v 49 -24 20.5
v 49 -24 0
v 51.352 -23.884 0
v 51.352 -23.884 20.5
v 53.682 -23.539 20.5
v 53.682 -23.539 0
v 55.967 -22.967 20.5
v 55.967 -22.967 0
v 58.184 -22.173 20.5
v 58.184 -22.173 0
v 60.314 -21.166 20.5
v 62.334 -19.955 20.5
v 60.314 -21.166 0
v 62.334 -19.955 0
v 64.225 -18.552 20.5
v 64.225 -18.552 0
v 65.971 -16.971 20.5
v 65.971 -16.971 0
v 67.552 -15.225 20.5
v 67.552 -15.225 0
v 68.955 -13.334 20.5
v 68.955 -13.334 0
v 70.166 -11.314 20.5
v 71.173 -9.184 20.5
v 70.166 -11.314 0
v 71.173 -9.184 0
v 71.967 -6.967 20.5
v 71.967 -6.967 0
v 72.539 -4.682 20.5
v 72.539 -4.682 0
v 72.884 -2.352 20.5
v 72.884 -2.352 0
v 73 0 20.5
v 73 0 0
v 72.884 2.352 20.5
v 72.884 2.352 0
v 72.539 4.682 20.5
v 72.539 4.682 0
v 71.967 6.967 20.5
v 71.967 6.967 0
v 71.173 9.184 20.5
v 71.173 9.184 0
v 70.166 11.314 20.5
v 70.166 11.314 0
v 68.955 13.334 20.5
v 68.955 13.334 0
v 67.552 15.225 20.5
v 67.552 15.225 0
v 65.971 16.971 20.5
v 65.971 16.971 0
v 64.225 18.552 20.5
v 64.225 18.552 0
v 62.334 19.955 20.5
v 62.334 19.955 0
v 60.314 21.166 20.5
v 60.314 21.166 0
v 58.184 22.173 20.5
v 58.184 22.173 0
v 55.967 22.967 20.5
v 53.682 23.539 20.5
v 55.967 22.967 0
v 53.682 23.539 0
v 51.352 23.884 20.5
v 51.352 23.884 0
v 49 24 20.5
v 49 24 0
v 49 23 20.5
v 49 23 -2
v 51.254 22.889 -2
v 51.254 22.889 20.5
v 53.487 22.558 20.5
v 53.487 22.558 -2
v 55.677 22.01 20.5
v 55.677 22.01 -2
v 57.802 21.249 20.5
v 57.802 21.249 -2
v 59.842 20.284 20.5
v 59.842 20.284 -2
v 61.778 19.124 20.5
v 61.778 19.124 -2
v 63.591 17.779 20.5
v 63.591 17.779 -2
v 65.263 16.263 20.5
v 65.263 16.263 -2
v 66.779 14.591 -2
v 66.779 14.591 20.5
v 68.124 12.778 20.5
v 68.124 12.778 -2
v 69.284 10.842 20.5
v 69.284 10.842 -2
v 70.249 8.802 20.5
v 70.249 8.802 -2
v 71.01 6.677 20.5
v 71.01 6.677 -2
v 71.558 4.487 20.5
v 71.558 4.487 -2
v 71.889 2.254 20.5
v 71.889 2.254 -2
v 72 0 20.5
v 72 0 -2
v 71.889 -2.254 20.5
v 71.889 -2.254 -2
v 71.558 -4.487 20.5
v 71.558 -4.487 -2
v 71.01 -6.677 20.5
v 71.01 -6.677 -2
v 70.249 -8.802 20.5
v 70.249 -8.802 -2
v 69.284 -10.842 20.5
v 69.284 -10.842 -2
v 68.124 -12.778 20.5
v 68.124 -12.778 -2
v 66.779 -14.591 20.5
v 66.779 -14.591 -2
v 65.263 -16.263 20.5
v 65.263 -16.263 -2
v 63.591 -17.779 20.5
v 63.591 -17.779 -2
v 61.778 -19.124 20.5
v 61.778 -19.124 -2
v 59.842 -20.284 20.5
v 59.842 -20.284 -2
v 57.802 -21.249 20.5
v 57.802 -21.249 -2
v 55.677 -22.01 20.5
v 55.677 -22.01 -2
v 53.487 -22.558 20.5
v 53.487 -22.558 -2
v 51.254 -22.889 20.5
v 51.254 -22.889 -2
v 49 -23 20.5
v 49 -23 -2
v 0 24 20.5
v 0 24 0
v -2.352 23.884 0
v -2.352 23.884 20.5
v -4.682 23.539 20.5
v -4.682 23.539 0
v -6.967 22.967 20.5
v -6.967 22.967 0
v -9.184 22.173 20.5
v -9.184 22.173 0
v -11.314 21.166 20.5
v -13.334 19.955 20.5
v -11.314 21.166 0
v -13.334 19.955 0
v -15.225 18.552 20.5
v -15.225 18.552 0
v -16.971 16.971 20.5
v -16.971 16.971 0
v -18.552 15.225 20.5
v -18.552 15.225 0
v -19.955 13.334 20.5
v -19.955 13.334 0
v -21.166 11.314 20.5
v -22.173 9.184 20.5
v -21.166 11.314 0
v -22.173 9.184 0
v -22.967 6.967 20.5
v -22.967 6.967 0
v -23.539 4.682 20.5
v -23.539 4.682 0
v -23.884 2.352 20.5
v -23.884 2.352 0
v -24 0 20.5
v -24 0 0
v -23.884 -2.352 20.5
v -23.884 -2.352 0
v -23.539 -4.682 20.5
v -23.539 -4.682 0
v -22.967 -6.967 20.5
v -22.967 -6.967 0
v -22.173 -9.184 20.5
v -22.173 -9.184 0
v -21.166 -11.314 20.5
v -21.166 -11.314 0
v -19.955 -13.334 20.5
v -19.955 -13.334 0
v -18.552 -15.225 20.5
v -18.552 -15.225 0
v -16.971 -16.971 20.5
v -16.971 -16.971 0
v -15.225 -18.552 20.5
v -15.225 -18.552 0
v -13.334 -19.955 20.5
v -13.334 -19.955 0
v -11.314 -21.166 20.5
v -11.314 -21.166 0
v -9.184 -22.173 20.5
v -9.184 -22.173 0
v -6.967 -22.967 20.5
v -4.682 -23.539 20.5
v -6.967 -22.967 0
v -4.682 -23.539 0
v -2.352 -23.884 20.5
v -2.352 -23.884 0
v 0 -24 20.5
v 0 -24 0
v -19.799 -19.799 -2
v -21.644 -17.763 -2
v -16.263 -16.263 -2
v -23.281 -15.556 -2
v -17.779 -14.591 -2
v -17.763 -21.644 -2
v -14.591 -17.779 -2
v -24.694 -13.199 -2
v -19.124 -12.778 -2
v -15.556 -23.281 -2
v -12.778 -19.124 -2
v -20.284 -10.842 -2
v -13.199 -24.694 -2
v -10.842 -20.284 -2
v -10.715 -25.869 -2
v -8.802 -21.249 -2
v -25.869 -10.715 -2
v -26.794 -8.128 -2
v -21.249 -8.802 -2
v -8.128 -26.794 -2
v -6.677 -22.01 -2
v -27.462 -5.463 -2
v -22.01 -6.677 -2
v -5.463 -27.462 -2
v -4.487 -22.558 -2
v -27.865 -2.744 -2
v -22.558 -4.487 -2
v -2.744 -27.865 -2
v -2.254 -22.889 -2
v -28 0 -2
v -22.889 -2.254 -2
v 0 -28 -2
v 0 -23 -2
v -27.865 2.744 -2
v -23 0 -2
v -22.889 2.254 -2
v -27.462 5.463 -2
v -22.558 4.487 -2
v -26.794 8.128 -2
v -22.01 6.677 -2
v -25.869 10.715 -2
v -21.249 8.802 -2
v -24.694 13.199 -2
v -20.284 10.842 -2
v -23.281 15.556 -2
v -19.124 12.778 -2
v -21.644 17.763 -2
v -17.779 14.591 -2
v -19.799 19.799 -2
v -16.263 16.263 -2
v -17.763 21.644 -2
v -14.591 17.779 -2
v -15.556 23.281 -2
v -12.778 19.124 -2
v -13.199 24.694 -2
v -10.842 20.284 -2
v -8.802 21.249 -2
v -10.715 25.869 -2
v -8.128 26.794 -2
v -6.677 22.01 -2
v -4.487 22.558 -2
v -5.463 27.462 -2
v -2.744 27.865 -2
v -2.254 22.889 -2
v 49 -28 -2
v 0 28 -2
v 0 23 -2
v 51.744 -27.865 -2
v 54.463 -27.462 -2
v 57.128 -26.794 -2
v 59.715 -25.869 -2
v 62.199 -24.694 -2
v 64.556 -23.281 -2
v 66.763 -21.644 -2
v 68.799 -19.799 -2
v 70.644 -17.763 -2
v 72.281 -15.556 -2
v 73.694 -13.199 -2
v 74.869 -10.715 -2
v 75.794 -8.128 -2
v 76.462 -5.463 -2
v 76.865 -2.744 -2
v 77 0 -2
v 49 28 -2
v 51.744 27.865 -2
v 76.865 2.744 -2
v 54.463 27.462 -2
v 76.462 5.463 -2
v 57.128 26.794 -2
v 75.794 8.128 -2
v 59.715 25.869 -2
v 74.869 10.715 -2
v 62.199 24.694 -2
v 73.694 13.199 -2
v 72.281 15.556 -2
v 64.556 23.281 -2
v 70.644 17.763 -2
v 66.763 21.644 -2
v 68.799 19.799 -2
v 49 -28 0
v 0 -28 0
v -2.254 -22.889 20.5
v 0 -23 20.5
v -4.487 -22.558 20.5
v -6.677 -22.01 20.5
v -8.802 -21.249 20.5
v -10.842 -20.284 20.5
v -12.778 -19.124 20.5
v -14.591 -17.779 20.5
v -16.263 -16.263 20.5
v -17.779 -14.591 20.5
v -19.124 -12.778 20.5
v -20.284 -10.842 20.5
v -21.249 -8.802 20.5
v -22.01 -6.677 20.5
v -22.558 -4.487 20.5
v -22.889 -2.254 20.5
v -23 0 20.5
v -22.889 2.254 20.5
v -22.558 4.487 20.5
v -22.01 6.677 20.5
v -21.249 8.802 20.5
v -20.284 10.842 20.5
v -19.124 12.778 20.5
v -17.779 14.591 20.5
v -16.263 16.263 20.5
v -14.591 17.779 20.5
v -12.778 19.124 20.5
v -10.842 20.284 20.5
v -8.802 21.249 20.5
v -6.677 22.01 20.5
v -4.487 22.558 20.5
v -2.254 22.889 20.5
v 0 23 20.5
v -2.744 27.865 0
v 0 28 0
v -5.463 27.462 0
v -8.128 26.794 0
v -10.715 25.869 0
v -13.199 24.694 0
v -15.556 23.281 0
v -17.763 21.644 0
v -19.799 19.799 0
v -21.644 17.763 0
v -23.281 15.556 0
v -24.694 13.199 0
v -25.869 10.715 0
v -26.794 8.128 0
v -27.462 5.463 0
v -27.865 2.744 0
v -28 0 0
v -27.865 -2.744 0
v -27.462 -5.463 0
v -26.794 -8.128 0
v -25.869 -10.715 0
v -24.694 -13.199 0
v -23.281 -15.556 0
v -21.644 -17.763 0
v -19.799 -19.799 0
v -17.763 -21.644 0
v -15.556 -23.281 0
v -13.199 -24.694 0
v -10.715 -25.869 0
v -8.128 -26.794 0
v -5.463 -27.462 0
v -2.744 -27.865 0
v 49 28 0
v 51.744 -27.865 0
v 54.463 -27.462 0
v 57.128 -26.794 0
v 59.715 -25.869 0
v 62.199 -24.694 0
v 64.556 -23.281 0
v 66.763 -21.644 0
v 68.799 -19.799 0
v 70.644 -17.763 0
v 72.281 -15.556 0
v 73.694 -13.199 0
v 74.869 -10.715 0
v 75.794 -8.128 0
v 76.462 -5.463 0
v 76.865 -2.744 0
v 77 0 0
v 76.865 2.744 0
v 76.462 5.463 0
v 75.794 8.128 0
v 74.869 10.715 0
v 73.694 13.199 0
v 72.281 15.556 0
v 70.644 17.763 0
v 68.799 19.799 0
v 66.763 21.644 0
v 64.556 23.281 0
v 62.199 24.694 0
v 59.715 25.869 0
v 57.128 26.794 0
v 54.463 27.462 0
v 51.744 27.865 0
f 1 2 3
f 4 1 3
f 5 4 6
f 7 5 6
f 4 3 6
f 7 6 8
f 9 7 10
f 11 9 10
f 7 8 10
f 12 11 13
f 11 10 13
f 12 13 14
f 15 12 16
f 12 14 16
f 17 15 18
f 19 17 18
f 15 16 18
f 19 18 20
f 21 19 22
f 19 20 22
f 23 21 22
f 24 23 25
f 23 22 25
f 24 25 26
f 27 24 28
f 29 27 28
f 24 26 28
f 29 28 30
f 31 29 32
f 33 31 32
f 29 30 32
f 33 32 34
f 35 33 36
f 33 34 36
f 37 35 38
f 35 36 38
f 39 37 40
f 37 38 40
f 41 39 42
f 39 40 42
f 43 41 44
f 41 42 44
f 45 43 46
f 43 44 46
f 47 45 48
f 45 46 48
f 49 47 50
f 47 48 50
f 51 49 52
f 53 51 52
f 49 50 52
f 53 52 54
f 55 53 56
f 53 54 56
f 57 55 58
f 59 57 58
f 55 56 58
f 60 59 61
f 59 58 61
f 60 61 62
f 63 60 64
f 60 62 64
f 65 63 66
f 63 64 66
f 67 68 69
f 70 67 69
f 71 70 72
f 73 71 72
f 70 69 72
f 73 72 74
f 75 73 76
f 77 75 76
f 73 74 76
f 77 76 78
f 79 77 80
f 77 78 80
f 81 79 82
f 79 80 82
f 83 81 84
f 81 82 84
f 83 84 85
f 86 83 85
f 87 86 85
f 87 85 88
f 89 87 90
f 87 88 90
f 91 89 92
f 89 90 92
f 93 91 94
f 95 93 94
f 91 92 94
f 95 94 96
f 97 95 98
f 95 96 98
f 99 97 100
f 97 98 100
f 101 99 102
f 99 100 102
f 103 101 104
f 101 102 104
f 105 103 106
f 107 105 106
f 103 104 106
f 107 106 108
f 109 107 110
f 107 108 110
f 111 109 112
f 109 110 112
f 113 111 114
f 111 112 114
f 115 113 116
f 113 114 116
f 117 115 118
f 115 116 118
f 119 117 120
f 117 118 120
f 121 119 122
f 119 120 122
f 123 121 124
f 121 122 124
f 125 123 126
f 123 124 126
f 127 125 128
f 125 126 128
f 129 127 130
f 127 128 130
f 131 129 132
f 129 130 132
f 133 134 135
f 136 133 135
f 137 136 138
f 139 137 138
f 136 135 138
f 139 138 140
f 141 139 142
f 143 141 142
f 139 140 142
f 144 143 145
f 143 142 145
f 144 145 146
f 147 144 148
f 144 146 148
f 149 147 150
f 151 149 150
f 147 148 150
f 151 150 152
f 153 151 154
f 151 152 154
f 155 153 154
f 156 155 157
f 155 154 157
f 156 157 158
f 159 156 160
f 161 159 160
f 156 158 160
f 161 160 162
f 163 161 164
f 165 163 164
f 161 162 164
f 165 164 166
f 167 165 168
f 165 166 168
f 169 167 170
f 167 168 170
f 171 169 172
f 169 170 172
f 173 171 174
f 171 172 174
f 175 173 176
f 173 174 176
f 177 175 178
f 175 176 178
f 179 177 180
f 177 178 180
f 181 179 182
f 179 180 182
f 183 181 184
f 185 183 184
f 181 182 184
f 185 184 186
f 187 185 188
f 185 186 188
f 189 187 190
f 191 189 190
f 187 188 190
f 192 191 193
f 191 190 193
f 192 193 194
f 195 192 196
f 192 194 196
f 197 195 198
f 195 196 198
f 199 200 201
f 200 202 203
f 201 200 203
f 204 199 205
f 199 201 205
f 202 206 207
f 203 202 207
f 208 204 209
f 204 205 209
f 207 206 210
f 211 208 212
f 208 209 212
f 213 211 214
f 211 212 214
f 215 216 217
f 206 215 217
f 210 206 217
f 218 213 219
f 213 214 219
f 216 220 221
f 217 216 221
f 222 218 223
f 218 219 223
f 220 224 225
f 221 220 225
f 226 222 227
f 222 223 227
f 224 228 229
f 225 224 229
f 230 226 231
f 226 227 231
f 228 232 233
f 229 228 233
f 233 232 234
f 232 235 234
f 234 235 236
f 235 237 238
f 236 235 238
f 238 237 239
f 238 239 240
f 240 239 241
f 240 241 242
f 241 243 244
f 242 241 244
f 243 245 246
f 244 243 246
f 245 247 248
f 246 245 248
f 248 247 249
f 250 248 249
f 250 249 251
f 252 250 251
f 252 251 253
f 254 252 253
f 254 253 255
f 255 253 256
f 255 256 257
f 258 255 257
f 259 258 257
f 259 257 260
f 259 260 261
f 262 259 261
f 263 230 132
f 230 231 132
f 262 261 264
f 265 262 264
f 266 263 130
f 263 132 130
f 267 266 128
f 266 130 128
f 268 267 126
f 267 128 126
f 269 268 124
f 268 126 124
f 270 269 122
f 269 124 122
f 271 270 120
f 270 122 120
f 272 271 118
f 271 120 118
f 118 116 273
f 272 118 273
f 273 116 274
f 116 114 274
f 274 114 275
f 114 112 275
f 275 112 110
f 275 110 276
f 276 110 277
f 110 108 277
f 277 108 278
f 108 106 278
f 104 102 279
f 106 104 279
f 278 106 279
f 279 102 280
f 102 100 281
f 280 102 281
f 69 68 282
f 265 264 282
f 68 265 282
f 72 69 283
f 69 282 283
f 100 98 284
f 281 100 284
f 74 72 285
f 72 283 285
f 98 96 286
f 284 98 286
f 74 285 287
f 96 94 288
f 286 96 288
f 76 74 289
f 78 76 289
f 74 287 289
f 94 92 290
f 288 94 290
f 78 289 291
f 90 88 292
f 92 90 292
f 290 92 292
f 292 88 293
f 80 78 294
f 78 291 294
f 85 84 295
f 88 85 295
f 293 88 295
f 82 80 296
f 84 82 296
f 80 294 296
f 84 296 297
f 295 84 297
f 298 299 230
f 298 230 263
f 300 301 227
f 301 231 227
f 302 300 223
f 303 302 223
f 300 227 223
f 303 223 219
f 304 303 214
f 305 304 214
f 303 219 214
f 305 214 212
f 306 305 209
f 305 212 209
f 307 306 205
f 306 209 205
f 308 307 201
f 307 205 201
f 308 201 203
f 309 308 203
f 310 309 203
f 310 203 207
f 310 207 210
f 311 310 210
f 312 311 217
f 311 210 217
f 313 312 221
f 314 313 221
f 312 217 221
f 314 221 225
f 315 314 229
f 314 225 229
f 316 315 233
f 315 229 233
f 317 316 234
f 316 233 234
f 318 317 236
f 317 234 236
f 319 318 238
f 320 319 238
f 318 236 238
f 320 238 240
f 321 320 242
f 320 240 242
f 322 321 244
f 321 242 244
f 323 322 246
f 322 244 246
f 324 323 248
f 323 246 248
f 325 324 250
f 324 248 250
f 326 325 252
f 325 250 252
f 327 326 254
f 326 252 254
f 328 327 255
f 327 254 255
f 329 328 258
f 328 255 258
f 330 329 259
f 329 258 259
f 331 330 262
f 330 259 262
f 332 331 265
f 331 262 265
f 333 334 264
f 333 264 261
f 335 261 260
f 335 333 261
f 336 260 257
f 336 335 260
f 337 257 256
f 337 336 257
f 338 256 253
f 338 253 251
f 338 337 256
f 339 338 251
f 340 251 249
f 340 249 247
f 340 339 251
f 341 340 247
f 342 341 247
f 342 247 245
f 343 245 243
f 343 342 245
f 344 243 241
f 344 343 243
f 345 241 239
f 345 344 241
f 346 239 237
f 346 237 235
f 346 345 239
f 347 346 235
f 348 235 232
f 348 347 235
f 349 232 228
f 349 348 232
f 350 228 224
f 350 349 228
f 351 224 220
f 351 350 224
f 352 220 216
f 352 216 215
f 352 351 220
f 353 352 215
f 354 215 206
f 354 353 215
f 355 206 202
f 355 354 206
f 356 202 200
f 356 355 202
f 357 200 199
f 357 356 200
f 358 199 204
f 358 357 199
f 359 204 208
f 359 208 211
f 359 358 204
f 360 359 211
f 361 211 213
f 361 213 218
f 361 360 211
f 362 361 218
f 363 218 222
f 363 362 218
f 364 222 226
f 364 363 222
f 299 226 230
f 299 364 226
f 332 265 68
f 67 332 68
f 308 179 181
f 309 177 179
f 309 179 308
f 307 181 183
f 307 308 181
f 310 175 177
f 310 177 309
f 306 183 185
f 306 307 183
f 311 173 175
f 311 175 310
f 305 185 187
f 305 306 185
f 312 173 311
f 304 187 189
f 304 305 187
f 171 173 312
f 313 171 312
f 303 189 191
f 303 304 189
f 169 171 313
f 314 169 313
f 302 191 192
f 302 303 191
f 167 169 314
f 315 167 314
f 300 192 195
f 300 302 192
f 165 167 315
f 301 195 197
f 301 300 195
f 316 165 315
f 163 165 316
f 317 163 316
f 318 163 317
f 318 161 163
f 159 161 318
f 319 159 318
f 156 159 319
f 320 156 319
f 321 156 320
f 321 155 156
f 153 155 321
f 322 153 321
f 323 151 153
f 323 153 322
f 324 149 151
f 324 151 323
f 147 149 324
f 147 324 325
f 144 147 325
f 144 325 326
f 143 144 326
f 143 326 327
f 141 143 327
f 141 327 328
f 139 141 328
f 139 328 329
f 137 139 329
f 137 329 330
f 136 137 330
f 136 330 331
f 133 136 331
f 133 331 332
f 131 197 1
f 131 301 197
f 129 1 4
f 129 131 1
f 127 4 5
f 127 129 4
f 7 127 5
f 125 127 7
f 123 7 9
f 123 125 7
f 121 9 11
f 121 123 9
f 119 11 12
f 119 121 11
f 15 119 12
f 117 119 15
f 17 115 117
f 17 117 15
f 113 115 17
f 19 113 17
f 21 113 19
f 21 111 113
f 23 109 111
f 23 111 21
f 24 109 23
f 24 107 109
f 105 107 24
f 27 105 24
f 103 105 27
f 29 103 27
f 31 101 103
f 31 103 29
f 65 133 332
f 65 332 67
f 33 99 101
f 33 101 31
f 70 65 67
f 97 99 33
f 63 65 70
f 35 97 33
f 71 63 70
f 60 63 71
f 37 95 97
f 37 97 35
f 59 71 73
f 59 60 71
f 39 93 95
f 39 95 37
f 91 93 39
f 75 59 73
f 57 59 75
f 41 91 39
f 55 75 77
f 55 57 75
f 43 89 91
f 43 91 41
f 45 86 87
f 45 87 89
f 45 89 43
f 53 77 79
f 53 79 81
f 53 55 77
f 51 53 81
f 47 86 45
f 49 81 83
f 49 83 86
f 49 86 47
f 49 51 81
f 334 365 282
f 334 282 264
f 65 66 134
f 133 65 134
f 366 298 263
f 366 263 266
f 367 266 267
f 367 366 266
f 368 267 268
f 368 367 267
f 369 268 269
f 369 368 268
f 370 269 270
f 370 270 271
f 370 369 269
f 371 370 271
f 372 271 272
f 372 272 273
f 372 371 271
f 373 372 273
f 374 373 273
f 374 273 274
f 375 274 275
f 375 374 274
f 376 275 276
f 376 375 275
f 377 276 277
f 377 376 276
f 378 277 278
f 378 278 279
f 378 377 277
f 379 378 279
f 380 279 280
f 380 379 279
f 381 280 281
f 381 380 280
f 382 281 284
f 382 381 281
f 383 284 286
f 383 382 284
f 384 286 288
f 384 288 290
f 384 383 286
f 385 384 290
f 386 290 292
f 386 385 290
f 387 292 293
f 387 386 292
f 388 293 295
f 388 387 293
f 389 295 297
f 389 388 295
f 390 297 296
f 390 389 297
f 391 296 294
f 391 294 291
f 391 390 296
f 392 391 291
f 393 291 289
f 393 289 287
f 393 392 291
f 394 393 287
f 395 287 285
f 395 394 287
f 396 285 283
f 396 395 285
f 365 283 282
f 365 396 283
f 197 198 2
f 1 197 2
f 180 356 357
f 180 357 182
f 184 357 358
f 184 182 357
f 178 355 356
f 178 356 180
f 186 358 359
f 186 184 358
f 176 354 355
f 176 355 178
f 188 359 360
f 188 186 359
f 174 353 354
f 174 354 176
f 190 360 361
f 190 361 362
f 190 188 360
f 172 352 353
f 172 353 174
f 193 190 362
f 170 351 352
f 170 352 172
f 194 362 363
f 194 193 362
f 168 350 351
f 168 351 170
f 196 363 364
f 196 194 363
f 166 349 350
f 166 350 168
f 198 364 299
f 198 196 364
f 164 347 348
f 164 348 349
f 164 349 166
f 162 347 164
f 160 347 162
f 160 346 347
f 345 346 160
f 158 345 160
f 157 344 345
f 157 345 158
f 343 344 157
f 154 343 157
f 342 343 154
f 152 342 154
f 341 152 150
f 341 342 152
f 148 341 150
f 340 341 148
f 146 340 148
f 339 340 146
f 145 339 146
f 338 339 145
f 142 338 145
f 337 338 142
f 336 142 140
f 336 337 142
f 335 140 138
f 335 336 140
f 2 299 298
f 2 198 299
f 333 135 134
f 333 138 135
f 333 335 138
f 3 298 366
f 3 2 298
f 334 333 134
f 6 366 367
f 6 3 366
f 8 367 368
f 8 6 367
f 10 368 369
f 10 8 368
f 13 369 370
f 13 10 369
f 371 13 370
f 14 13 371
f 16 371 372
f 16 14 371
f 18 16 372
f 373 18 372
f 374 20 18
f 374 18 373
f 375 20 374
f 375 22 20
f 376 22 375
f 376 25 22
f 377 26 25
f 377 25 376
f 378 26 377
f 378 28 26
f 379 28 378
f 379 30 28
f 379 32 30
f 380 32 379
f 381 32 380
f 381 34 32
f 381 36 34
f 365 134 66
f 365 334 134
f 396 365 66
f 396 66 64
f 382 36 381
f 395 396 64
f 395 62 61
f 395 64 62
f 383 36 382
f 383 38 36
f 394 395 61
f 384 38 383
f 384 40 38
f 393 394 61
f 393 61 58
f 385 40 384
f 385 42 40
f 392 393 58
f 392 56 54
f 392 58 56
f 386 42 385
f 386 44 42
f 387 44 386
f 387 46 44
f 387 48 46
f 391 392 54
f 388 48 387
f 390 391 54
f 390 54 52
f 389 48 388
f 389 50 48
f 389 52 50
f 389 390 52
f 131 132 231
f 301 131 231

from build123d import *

# Parameters (mm, degrees)
F1_DEPTH = 2
F2_DEPTH = 20.5


with BuildPart() as f1:
    # F0 (on Top) → F1 (new body)
    with BuildSketch(Plane.XY):
        with BuildLine():
            Line((49, 28), (0, 28))
            ThreePointArc((0, 28), (-28, 0), (0, -28))
            Line((0, -28), (49, -28))
            ThreePointArc((49, -28), (77, 0), (49, 28))
        make_face()
        with BuildLine():
            ThreePointArc((0, -24), (-24, 0), (0, 24))
            Line((0, 24), (49, 24))
            ThreePointArc((49, 24), (73, 0), (49, -24))
            Line((49, -24), (0, -24))
        make_face(mode=Mode.SUBTRACT)
        with BuildLine():
            Line((49, 24), (0, 24))
            ThreePointArc((0, 24), (-24, 0), (0, -24))
            Line((0, -24), (49, -24))
            ThreePointArc((49, -24), (73, 0), (49, 24))
        make_face()
        with BuildLine():
            ThreePointArc((0, -23), (-23, 0), (0, 23))
            Line((0, 23), (49, 23))
            ThreePointArc((49, 23), (72, 0), (49, -23))
            Line((49, -23), (0, -23))
        make_face(mode=Mode.SUBTRACT)
    extrude(amount=-F1_DEPTH)

    # F0 (on Top) → F2 (join)
    with BuildSketch(Plane.XY):
        with BuildLine():
            Line((49, 24), (0, 24))
            ThreePointArc((0, 24), (-24, 0), (0, -24))
            Line((0, -24), (49, -24))
            ThreePointArc((49, -24), (73, 0), (49, 24))
        make_face()
        with BuildLine():
            ThreePointArc((0, -23), (-23, 0), (0, 23))
            Line((0, 23), (49, 23))
            ThreePointArc((49, 23), (72, 0), (49, -23))
            Line((49, -23), (0, -23))
        make_face(mode=Mode.SUBTRACT)
    extrude(amount=F2_DEPTH)


solid = f1.part
